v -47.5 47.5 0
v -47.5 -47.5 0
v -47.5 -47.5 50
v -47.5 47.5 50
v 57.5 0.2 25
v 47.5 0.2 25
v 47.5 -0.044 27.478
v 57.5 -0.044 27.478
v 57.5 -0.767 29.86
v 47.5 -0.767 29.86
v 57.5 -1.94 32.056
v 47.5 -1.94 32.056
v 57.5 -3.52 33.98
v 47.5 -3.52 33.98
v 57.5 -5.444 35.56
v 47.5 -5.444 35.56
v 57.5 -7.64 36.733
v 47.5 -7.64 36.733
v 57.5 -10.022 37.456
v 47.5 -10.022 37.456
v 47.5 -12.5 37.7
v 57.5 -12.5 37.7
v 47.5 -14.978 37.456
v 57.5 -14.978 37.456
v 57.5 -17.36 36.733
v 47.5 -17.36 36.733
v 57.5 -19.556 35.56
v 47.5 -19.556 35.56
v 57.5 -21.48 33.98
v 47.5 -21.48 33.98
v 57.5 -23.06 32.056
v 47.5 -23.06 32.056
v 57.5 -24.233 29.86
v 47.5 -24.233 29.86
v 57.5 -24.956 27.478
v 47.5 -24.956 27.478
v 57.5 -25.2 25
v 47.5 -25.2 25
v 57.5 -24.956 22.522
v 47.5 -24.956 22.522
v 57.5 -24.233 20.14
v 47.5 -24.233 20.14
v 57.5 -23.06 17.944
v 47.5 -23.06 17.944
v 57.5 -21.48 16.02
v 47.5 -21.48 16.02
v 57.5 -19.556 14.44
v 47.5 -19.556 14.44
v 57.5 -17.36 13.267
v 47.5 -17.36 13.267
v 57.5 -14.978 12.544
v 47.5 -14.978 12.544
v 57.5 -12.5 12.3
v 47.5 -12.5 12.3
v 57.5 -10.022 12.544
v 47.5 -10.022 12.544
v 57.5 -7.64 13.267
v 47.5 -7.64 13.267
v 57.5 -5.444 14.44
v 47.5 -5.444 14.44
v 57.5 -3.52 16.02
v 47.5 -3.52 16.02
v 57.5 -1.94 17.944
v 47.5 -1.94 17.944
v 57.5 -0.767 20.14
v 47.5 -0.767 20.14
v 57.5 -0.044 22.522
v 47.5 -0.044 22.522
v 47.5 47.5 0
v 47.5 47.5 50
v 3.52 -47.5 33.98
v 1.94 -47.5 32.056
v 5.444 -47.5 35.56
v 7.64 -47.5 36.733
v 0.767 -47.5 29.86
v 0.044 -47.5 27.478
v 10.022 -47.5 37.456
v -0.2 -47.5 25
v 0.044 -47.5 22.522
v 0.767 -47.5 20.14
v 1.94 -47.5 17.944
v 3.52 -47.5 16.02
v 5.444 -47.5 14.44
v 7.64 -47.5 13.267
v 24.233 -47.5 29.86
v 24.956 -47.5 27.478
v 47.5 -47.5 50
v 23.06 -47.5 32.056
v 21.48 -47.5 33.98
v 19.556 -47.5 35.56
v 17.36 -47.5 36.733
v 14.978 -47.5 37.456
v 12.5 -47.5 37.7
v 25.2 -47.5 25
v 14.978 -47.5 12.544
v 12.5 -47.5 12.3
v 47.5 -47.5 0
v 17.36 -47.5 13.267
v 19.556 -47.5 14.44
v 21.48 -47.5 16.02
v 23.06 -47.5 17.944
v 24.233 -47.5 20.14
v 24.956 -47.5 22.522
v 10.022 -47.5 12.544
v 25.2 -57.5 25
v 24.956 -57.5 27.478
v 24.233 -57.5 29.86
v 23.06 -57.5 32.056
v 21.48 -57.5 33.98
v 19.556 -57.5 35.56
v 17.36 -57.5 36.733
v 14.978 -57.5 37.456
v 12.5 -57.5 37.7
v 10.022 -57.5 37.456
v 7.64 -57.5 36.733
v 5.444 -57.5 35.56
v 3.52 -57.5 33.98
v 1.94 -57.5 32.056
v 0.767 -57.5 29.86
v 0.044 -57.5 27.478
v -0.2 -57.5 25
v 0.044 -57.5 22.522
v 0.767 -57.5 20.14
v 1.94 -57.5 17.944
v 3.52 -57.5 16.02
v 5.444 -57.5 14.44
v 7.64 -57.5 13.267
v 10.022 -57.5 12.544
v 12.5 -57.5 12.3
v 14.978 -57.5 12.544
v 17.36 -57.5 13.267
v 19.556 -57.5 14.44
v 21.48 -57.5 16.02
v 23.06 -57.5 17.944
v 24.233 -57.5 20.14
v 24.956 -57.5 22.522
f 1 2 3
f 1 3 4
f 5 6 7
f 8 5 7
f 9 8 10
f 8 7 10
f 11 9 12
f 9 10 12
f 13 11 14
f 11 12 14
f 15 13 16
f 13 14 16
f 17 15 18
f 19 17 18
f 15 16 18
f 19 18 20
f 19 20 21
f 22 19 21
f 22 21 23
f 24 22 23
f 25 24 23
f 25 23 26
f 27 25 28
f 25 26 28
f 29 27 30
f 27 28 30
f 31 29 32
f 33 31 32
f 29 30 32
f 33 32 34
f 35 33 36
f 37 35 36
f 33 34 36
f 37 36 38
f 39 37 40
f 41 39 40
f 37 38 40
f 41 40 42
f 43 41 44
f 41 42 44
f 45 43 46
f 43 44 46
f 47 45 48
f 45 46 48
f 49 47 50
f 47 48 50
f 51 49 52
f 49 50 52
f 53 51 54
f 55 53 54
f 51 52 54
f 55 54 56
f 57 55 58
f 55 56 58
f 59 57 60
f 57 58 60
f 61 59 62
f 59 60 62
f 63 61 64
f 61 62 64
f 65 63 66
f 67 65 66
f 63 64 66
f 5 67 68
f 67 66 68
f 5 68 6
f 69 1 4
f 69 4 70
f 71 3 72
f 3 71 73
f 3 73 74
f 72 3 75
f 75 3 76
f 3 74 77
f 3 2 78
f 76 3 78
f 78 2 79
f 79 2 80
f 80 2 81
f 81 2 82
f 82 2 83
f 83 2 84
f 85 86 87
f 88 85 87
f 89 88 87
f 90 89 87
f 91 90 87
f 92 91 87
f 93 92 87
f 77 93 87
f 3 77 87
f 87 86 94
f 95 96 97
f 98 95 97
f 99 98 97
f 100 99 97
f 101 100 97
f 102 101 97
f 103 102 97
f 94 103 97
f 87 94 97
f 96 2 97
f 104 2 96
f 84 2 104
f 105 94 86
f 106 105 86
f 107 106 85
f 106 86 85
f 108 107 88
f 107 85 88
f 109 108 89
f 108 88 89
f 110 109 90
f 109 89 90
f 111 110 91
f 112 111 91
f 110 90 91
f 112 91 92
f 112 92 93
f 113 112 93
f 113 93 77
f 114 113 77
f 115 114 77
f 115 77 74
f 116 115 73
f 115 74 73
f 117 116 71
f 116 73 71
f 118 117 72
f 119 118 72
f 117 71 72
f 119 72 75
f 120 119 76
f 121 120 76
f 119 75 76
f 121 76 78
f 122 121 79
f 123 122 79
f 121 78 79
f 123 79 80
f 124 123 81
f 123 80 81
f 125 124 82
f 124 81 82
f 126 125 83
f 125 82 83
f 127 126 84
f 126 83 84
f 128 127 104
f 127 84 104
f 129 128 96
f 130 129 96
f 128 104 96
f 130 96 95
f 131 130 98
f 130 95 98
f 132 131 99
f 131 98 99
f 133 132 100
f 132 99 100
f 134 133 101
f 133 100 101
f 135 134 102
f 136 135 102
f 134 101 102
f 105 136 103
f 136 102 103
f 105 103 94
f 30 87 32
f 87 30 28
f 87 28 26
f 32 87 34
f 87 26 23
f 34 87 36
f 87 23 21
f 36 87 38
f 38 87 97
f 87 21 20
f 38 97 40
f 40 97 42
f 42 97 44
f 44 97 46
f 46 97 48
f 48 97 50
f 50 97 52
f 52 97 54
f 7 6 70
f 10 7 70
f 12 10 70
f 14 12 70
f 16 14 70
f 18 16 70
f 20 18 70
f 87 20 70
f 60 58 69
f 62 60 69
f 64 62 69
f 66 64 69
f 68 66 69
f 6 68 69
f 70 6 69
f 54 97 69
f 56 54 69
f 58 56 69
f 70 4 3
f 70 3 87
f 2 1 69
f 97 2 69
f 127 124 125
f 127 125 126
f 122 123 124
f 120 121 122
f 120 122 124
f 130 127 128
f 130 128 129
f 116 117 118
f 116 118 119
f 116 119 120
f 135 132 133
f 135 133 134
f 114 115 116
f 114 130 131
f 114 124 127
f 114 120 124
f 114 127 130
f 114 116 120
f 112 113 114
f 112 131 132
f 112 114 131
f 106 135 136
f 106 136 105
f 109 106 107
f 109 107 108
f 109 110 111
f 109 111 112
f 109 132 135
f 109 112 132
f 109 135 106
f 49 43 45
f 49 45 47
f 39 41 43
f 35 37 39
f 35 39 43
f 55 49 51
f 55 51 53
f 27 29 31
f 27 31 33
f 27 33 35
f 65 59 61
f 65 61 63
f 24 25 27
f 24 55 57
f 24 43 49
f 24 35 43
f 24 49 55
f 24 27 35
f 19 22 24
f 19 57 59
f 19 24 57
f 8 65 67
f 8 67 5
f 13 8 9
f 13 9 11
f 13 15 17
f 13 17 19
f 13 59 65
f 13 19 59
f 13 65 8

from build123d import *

# Parameters (mm, degrees)
F0_W     = 95
F0_H     = 95
F1_DEPTH = 50
F2_R     = 12.7
F3_DEPTH = 10
F4_R     = 12.7
F5_DEPTH = 10


with BuildPart() as f1:
    # F0 (on Top) → F1 (new body)
    with BuildSketch(Plane.XY):
        Rectangle(F0_W, F0_H)
    extrude(amount=F1_DEPTH)

    # F2 (on face) → F3 (join)
    with BuildSketch(Plane.XZ.offset(47.5)):
        with Locations((12.5, 25)):
            Circle(F2_R)
    extrude(amount=F3_DEPTH)

    # F4 (on face) → F5 (join)
    with BuildSketch(Plane.YZ.offset(47.5)):
        with Locations((-12.5, 25)):
            Circle(F4_R)
    extrude(amount=F5_DEPTH)


solid = f1.part
